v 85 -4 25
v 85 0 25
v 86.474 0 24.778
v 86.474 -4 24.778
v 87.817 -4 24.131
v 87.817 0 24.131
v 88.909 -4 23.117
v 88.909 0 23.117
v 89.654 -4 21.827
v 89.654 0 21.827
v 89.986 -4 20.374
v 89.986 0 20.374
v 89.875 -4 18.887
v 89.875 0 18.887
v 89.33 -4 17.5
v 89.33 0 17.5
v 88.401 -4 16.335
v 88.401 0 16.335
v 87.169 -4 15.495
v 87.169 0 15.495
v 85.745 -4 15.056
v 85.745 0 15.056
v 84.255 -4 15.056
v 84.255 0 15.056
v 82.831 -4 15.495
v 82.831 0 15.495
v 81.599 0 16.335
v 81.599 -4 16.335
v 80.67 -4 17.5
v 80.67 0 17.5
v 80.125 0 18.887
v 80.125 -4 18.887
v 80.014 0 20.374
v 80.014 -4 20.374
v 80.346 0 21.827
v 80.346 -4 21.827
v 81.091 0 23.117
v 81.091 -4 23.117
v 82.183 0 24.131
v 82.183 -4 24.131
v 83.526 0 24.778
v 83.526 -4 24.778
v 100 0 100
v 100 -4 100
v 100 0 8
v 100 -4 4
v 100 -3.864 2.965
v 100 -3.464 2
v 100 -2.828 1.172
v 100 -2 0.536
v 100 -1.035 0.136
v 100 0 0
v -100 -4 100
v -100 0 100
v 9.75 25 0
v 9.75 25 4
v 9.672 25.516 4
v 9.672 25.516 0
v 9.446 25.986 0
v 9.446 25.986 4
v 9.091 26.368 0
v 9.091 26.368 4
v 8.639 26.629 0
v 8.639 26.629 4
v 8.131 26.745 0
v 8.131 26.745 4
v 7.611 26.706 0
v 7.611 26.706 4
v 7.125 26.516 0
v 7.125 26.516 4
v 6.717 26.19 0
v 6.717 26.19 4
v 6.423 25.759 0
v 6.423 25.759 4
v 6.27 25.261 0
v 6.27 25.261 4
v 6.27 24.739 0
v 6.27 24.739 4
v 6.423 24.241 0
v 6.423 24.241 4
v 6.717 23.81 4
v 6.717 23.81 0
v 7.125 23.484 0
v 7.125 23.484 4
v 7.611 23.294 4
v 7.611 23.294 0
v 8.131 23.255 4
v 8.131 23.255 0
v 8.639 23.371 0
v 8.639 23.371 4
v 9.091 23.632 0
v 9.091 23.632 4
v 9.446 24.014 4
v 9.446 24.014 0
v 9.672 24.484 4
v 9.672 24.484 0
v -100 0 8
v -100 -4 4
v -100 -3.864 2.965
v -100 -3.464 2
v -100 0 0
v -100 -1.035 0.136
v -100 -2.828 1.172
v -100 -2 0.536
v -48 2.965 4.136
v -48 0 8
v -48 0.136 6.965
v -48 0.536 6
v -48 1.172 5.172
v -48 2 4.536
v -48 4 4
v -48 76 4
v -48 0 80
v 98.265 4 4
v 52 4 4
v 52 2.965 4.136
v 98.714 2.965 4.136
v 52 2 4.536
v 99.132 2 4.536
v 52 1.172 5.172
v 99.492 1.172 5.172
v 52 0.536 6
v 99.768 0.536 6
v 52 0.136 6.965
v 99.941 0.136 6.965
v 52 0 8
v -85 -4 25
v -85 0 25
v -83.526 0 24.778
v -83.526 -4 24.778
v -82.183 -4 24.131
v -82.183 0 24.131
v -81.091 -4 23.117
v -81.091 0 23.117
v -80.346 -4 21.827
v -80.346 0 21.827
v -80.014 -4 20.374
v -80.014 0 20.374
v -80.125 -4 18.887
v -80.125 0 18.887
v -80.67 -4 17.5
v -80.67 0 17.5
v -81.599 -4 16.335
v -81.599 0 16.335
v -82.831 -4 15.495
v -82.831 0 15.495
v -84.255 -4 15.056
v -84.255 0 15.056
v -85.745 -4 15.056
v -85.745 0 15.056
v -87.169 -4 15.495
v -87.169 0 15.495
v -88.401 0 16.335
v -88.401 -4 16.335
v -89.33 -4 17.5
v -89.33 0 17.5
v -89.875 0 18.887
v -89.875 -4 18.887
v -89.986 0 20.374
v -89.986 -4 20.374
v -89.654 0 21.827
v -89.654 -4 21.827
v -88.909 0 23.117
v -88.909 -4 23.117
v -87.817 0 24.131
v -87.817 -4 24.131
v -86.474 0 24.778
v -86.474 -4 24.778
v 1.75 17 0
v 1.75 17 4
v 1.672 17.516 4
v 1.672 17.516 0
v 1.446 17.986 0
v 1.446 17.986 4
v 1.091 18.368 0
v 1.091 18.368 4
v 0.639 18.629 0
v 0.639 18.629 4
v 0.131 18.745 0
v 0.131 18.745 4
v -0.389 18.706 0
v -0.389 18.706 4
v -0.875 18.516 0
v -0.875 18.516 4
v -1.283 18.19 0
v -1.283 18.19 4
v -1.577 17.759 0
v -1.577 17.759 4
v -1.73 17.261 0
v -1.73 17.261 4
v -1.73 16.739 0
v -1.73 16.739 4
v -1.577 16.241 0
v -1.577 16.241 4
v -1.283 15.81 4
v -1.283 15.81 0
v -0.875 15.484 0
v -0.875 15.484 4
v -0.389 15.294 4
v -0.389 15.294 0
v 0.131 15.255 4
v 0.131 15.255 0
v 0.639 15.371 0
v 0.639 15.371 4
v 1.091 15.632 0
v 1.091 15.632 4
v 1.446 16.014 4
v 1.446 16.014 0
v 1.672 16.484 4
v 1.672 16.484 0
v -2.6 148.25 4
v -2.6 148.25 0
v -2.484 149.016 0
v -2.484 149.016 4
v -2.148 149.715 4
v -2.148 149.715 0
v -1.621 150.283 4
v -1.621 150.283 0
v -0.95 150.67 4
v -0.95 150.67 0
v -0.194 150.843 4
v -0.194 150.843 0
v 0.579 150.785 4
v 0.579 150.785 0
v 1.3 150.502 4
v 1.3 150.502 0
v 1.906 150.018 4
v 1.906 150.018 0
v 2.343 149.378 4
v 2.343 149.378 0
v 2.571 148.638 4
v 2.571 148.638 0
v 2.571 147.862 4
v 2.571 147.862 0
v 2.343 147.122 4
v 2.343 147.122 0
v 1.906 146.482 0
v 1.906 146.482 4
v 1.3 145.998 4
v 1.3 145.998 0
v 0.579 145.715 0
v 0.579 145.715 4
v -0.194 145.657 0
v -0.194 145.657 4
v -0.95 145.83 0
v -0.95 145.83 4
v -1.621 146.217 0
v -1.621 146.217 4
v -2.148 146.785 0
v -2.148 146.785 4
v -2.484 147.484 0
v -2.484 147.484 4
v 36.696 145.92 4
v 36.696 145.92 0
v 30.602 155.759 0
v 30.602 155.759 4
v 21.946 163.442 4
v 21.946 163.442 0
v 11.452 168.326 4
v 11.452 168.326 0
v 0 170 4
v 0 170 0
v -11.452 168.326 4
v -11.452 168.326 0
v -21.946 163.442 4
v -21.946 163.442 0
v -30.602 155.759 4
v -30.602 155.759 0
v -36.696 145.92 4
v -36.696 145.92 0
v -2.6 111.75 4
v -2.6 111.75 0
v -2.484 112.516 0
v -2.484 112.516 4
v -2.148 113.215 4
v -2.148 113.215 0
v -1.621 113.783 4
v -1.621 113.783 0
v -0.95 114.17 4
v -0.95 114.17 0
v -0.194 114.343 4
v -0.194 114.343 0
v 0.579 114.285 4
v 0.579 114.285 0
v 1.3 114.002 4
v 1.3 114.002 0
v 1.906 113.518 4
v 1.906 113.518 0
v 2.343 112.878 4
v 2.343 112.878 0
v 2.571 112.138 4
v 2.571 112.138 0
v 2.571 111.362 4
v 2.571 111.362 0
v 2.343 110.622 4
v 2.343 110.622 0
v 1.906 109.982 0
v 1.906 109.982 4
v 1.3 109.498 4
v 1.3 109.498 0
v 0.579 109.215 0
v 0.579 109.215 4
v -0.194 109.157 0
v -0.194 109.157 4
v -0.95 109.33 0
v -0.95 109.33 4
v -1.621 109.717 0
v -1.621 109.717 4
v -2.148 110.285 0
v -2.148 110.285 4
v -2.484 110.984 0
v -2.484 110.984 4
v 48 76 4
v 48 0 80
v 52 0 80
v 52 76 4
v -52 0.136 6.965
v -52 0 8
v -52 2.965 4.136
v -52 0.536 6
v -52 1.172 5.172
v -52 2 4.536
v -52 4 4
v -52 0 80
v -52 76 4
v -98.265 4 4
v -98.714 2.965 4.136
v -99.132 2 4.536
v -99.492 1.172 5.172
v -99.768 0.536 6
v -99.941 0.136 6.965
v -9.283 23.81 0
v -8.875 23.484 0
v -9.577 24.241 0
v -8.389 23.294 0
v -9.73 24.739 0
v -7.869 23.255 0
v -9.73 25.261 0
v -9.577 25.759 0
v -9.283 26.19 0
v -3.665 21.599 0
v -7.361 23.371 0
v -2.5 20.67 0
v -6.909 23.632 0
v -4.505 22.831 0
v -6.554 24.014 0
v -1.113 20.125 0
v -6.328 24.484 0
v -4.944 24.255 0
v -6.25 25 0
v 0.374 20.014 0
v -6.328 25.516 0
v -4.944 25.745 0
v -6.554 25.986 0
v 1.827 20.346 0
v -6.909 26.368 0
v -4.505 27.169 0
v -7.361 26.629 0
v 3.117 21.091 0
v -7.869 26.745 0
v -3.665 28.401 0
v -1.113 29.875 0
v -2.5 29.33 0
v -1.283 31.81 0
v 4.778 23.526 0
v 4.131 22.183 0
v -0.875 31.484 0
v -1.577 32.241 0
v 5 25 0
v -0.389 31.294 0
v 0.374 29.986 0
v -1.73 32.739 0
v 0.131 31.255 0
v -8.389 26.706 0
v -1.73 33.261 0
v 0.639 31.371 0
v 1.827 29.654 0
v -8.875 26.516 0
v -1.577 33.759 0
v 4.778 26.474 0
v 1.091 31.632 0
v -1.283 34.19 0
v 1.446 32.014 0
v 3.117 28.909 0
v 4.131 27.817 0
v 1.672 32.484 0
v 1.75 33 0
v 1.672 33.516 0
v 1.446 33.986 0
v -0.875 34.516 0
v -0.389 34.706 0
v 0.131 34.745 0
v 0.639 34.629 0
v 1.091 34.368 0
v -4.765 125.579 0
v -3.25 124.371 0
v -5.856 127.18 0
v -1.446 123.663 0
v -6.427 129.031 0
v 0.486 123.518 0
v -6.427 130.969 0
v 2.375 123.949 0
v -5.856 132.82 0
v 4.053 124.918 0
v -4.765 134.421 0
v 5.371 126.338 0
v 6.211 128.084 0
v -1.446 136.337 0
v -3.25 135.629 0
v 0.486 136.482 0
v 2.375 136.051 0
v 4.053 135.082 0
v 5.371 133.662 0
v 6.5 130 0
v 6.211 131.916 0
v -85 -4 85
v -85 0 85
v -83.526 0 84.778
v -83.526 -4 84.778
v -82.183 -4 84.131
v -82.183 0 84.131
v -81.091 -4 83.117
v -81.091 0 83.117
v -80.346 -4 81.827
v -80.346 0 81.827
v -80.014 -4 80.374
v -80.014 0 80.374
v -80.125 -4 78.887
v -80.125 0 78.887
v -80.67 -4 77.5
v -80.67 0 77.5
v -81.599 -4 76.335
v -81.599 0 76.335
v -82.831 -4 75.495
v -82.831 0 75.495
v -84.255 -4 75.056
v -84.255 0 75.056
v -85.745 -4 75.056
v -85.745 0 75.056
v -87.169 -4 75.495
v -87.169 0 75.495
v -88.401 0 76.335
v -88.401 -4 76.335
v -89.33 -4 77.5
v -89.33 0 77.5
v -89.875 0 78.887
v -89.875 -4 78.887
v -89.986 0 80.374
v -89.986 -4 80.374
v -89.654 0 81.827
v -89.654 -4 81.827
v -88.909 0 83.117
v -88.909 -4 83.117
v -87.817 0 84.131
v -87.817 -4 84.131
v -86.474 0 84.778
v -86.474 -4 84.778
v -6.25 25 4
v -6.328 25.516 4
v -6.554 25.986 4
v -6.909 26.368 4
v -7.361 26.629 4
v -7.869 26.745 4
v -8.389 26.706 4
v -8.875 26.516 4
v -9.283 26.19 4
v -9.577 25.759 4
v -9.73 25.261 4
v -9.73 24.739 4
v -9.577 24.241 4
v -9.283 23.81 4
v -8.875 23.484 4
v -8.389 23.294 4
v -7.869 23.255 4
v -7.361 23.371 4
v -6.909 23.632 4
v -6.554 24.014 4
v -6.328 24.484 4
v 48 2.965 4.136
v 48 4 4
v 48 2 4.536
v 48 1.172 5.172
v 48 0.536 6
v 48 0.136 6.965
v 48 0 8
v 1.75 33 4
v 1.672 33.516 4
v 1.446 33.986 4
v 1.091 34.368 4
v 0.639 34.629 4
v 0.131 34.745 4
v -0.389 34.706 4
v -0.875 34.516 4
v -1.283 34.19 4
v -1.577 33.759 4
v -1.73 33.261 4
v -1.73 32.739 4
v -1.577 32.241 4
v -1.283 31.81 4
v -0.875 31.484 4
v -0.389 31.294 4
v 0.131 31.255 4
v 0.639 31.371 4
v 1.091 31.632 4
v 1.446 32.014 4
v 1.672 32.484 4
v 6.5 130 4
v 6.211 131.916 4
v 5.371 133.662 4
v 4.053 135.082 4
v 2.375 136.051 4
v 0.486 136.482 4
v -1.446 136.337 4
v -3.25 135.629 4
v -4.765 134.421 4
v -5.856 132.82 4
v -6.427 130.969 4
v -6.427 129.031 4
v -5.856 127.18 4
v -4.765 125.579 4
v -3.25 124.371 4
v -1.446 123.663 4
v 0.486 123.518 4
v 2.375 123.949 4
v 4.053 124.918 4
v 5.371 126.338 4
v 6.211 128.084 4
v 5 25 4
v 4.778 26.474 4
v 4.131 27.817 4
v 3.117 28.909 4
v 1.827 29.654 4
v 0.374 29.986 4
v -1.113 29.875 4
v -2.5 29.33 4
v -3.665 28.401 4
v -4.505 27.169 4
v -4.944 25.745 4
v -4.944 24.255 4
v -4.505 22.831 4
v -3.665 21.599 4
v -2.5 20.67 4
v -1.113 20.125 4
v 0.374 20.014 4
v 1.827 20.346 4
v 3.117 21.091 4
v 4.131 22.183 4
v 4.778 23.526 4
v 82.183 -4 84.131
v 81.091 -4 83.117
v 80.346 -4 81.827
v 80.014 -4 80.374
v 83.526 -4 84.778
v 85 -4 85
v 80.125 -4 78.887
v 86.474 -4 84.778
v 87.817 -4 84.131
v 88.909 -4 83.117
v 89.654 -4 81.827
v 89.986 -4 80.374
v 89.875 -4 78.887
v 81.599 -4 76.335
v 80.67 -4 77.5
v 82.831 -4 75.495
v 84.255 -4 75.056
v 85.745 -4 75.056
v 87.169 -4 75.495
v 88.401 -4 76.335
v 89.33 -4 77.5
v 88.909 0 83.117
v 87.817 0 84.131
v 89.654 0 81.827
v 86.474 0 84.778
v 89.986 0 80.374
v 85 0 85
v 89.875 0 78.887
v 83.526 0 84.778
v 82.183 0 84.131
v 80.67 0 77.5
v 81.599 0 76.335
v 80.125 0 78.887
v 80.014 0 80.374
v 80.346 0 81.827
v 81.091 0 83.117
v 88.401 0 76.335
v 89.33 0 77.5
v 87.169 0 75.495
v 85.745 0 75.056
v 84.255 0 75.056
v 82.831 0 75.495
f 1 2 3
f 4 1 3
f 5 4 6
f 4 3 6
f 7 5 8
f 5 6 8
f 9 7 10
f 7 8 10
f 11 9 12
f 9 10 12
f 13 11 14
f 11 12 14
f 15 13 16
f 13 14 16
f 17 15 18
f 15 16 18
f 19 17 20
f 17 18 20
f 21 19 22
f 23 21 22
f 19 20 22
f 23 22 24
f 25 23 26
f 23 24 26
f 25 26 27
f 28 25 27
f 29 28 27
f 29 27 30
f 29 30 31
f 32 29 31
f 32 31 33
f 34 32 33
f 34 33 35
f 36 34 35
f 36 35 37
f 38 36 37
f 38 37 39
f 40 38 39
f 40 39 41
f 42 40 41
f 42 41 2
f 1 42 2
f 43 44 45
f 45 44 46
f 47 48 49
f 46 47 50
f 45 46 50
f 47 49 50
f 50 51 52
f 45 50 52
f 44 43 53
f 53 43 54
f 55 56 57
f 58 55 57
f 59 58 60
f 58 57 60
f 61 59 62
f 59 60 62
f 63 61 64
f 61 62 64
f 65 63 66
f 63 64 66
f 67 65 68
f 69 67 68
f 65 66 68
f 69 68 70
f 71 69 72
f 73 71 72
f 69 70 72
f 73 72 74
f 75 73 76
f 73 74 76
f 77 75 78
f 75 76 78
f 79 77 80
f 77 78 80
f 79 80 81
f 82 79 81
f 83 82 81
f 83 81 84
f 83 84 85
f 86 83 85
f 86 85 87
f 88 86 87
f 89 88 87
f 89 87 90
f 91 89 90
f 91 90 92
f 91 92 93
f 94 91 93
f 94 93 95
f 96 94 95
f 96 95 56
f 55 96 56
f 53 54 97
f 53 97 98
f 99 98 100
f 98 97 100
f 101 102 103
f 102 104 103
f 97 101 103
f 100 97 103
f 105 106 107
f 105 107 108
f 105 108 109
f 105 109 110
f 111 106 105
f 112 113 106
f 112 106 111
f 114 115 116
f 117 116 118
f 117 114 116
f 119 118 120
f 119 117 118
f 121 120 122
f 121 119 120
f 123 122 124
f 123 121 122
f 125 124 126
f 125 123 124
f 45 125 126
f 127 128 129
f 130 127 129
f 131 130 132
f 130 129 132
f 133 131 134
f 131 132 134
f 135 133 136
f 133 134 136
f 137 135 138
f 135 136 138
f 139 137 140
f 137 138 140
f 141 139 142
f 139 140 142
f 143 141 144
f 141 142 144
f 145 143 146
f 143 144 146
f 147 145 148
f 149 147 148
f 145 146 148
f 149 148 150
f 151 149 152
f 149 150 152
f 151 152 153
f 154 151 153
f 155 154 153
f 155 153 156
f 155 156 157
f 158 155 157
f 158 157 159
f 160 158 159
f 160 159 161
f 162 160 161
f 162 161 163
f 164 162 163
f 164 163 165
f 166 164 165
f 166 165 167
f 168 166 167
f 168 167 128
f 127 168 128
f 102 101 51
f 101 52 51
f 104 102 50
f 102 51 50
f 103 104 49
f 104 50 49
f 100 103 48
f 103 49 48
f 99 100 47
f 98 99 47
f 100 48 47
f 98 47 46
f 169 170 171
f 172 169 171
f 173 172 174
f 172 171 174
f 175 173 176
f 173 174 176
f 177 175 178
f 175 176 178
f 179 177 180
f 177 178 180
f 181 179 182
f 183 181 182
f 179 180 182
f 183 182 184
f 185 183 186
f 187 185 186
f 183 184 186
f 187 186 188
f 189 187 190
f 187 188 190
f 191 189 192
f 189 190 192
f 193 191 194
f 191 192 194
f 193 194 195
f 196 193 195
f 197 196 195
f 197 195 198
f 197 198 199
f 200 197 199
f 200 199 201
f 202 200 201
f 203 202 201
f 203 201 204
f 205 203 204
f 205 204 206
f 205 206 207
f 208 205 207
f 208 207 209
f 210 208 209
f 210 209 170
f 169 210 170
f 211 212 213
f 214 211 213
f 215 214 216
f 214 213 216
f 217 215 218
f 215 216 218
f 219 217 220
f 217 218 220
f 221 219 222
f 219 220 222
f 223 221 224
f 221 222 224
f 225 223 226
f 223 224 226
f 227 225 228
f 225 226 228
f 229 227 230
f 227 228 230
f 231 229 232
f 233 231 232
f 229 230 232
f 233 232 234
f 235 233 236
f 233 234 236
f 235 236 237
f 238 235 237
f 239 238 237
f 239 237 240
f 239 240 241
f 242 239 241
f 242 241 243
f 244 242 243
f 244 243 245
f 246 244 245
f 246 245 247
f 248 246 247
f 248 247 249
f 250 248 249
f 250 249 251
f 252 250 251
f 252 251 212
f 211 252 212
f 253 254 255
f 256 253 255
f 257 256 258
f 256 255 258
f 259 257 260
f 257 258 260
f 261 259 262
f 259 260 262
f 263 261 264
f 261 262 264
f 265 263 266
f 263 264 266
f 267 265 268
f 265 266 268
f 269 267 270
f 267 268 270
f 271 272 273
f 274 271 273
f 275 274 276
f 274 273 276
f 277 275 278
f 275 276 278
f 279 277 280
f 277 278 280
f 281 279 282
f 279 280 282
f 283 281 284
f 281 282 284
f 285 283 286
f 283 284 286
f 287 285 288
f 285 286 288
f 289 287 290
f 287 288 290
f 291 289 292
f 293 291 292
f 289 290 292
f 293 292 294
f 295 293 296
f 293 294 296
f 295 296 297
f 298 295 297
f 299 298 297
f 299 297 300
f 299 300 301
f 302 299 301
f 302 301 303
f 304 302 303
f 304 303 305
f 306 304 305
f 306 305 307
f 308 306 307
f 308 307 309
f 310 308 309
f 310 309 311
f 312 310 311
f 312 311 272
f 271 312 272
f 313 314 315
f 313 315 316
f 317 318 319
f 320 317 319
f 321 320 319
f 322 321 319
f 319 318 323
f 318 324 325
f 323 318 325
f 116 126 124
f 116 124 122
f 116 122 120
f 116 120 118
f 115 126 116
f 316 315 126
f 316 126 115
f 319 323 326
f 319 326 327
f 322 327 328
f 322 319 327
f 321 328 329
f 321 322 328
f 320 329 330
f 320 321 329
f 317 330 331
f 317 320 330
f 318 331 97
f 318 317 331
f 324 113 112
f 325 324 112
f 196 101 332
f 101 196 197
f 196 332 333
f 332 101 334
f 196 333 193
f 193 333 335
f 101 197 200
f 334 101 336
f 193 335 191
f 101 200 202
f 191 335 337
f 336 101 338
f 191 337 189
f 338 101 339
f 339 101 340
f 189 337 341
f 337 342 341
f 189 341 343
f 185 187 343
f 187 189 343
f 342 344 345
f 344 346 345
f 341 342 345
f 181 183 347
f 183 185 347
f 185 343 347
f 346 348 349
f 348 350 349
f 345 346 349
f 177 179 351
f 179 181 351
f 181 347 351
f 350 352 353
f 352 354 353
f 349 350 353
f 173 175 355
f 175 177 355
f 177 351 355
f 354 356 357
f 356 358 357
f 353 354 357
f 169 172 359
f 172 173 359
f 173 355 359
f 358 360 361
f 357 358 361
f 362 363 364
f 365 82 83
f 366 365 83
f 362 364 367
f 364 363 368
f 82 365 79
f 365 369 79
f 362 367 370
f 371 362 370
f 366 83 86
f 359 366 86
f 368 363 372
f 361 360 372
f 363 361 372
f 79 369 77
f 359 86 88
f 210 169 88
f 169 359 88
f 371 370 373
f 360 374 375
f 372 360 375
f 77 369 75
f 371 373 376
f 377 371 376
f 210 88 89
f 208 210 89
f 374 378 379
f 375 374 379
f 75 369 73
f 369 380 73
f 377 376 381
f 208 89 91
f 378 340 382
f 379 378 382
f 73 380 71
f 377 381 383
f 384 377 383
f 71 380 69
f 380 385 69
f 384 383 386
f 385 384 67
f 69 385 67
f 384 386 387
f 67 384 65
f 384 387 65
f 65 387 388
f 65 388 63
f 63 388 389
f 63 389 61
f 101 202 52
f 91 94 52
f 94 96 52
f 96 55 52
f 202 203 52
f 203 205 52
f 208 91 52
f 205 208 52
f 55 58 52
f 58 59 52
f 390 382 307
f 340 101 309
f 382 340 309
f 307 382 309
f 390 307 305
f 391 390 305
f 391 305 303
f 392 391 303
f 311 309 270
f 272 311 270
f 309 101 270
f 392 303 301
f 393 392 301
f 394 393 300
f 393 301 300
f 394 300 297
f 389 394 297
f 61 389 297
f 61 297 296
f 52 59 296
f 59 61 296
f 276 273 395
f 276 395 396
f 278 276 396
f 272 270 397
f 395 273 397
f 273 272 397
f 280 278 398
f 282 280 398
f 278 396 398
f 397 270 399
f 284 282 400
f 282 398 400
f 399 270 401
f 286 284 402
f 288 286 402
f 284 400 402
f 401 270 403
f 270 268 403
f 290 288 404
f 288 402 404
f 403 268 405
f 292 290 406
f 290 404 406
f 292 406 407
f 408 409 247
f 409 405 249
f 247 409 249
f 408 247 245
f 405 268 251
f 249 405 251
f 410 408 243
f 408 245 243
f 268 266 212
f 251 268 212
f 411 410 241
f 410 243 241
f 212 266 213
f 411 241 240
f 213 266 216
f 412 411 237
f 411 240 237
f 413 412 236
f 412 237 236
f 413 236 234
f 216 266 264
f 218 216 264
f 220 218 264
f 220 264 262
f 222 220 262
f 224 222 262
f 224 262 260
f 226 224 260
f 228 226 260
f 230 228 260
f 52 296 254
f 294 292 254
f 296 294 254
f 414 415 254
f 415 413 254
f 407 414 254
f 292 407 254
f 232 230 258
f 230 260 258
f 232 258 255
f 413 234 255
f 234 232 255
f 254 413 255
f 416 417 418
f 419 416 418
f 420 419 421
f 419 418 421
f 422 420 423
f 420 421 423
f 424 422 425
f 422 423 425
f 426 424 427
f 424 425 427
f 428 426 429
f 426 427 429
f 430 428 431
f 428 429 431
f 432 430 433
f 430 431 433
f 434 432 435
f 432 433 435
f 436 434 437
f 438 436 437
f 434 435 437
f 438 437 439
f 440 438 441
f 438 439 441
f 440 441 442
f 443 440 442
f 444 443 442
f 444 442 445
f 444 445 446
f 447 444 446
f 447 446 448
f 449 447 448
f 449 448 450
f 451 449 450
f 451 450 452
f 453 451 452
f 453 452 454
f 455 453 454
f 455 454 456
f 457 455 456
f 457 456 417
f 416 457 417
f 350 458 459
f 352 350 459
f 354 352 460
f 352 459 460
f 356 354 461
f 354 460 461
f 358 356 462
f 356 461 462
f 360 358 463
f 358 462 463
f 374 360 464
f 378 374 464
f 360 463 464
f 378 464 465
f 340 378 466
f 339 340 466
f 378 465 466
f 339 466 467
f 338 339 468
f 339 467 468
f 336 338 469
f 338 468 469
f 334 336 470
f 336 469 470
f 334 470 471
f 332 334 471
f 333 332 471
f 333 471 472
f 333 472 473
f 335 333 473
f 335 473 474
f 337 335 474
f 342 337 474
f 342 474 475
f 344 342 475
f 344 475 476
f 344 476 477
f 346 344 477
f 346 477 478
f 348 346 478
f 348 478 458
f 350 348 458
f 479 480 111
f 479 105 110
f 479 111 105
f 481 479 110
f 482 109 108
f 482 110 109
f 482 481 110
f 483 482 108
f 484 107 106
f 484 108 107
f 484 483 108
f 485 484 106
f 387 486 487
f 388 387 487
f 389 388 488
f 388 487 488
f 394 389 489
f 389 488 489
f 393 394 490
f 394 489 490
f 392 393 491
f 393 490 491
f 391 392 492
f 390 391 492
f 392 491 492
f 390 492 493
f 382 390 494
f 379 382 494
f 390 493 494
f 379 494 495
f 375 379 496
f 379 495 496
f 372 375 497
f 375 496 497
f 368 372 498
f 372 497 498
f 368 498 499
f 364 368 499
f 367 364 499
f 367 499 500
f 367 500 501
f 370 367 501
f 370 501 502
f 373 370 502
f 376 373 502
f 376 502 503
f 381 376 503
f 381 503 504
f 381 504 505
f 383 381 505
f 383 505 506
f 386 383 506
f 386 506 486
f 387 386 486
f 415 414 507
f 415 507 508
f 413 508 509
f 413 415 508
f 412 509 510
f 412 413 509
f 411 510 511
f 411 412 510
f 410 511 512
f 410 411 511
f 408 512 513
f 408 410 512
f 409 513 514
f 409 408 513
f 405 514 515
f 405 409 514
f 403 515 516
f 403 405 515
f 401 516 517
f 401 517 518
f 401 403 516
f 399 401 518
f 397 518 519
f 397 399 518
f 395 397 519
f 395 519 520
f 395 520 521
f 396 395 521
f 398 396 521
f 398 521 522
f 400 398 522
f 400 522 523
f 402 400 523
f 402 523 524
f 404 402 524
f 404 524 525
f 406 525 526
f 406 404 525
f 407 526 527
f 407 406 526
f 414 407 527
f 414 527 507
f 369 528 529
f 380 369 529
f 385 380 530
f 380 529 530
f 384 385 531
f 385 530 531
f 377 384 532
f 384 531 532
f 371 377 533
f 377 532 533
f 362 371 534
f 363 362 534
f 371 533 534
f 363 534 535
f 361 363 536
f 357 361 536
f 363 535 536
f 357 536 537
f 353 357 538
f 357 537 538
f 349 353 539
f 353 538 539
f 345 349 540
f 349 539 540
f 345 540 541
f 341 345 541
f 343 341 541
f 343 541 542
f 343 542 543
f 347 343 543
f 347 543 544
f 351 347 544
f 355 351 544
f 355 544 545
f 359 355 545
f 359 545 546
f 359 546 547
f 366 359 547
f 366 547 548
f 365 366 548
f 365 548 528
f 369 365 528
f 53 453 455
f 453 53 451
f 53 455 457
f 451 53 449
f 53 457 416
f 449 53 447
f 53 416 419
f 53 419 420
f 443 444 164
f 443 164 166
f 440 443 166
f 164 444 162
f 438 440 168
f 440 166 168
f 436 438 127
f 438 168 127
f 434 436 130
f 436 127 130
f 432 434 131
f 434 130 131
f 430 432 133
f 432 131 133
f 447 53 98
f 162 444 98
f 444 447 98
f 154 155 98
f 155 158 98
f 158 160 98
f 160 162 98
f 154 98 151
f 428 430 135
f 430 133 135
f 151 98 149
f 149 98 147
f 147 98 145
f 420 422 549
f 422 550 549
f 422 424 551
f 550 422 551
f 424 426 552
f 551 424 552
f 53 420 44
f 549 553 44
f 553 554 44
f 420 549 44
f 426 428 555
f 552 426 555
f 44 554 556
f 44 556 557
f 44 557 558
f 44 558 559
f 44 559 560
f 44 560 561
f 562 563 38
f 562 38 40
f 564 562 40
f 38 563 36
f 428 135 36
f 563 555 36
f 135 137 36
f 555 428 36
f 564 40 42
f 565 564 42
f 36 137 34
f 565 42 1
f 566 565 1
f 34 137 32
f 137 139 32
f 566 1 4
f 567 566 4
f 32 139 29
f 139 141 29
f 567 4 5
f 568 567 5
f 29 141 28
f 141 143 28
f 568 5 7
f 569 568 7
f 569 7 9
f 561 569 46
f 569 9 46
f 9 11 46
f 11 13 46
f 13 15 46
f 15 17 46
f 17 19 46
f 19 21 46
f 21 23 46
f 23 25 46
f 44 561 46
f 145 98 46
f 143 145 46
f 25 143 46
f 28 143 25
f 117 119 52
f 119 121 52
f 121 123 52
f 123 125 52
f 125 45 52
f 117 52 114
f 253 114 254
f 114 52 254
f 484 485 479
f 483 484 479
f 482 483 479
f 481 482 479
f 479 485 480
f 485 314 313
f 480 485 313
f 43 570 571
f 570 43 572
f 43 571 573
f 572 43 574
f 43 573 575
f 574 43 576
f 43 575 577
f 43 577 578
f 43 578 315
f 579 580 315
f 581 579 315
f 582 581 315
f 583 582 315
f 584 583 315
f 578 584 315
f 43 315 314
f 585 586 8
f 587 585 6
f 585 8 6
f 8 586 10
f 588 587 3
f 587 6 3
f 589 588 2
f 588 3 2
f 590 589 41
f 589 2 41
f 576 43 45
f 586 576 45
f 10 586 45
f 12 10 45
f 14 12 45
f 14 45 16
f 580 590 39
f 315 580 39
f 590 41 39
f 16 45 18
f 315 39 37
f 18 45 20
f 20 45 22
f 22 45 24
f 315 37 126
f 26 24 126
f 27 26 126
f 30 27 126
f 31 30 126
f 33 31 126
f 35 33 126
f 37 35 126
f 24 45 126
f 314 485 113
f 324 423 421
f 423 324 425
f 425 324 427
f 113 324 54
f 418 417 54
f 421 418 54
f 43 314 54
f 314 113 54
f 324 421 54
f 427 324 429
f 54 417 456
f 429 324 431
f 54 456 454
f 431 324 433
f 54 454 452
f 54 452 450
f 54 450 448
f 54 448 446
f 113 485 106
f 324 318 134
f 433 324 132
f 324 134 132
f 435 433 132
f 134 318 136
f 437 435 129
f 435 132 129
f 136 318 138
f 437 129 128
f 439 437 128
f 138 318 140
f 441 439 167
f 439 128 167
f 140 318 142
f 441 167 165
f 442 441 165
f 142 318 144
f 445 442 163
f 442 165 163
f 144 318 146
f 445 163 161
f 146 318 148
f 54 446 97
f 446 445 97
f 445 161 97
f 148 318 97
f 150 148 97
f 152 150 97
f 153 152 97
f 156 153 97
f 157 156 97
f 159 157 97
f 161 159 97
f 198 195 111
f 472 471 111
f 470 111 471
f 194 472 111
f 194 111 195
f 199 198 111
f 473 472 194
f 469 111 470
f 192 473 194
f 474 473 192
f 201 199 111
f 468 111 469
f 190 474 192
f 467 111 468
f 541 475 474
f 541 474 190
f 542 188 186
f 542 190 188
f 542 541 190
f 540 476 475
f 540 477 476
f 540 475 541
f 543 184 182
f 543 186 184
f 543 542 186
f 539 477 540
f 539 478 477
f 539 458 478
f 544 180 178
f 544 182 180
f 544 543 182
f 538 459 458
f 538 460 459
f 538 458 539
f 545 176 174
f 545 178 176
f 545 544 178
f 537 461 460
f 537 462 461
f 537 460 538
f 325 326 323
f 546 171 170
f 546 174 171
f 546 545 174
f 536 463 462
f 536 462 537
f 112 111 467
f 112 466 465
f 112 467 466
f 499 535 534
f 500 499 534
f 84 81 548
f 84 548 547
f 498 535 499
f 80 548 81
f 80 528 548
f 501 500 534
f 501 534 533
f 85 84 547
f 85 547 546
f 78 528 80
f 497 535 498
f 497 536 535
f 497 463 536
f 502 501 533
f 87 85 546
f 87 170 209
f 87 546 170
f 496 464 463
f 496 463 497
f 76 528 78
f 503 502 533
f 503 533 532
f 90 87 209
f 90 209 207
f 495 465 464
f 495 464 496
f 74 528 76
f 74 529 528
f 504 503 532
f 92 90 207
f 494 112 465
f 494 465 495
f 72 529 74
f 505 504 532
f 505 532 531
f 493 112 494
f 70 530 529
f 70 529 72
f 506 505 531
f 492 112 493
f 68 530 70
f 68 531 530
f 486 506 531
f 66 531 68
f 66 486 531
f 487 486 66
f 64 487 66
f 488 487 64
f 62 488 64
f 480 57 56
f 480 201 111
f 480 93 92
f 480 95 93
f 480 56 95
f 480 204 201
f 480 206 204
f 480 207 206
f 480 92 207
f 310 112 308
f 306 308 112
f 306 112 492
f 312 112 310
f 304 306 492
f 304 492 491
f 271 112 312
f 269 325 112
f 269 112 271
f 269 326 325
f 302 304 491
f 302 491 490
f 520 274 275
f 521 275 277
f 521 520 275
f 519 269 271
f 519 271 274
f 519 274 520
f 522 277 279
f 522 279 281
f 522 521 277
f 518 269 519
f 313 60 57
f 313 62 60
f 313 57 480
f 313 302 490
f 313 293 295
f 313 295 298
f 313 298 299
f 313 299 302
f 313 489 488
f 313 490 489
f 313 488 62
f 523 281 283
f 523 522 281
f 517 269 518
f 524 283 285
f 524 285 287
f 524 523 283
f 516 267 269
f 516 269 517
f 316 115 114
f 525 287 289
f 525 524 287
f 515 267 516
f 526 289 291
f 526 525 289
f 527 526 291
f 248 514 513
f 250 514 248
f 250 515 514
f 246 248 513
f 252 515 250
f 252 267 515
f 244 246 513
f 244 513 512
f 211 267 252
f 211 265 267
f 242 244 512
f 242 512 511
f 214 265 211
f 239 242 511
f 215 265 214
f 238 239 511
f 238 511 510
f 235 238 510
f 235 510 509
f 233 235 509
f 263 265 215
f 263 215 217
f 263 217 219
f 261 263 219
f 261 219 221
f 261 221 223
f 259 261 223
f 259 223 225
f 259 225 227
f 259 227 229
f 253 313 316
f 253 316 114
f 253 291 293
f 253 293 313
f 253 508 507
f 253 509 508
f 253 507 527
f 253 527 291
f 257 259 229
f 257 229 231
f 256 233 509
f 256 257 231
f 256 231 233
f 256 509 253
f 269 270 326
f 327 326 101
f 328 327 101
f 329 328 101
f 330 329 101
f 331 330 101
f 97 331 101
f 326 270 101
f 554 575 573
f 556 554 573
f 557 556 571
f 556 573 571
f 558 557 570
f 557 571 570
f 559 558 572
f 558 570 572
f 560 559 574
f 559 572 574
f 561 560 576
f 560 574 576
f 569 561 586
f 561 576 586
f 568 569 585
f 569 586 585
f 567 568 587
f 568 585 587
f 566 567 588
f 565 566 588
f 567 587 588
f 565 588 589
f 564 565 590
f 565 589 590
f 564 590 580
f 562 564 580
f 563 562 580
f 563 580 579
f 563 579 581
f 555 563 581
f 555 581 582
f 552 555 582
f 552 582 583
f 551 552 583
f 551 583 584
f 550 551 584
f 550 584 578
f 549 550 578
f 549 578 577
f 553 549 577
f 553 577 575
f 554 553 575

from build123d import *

# Parameters (mm, degrees)
SKETCH1_R           = 6.5
BOSS_EXTRUDE1_DEPTH = 4
SKETCH4_R           = 2.6
CUT_EXTRUDE1_DEPTH  = 10
SKETCH5_W           = 200
SKETCH5_H           = 4
BOSS_EXTRUDE2_DEPTH = 100
FILLET1_R           = 4
SKETCH8_R           = 5
CUT_EXTRUDE2_DEPTH  = 100
SKETCH9_R           = 5
SKETCH9_R_2         = 1.75
CUT_EXTRUDE3_DEPTH  = 10
RIB1_REACH          = 249.79
SKETCH10_WALL_W     = 610.717552724
SKETCH10_WALL_H     = 4


with BuildPart() as part:
    # Sketch1 → Boss-Extrude1 (new body)
    with BuildSketch(Plane.XY):
        with BuildLine():
            Line((100, -4), (100, 0))
            Line((100, 0), (36.695562583, 145.919663525))
            ThreePointArc((36.695562583, 145.919663525), (0, 170), (-36.695562583, 145.919663525))
            Line((-36.695562583, 145.919663525), (-100, 0))
            Line((-100, 0), (-100, -4))
            Line((-100, -4), (100, -4))
        make_face()
        with Locations((0, 130)):
            Circle(SKETCH1_R, mode=Mode.SUBTRACT)
    extrude(amount=BOSS_EXTRUDE1_DEPTH)

    # Sketch4 → Cut-Extrude1 (cut)
    with BuildSketch(Plane(origin=(0, 0, 0), x_dir=(-1, 0, 0), z_dir=(0, 0, -1))):
        with Locations((0, 111.75)):
            Circle(SKETCH4_R)
        with Locations((0, 148.25)):
            Circle(SKETCH4_R)
    extrude(amount=-CUT_EXTRUDE1_DEPTH, mode=Mode.SUBTRACT)

    # Sketch5 → Boss-Extrude2 (add)
    with BuildSketch(Plane(origin=(0, 0, 0), x_dir=(-1, 0, 0), z_dir=(0, 0, -1))):
        with Locations((0, -2)):
            Rectangle(SKETCH5_W, SKETCH5_H)
    extrude(amount=-BOSS_EXTRUDE2_DEPTH)

    # Fillet1
    fillet1_edges = [part.edges().sort_by_distance(p)[0] for p in [
        (0, -4, 0),
        (0, 0, 4),
    ]]
    fillet(fillet1_edges, radius=FILLET1_R)

    # Sketch8 → Cut-Extrude2 (cut)
    with BuildSketch(Plane(origin=(0, 0, 0), x_dir=(1, 0, 0), z_dir=(0, 1, 0))):
        with Locations(Location((-85, -80, 0), (0, 0, 270))):
            Circle(SKETCH8_R)
        with Locations(Location((-85, -20, 0), (0, 0, 270))):
            Circle(SKETCH8_R)
        with Locations(Location((85, -80, 0), (0, 0, 270))):
            Circle(SKETCH8_R)
        with Locations(Location((85, -20, 0), (0, 0, 270))):
            Circle(SKETCH8_R)
    extrude(amount=-CUT_EXTRUDE2_DEPTH, mode=Mode.SUBTRACT)

    # Sketch9 → Cut-Extrude3 (cut)
    with BuildSketch(Plane.XY.offset(4)):
        with Locations((0, 25)):
            Circle(SKETCH9_R)
        with Locations((0, 33)):
            Circle(SKETCH9_R_2)
        with Locations((0, 17)):
            Circle(SKETCH9_R_2)
        with Locations((8, 25)):
            Circle(SKETCH9_R_2)
        with Locations((-8, 25)):
            Circle(SKETCH9_R_2)
    extrude(amount=-CUT_EXTRUDE3_DEPTH, mode=Mode.SUBTRACT)

    # Sketch10 wall → Rib1 (add, up to next)
    with BuildSketch(Plane(origin=(-50, 40, 40), x_dir=(0, 0.707106781187, -0.707106781187), z_dir=(0, -0.707106781187, -0.707106781187)), mode=Mode.PRIVATE) as rib1_sk1:
        Rectangle(SKETCH10_WALL_W, SKETCH10_WALL_H)
    rib1_tool1 = extrude(rib1_sk1.sketch, amount=RIB1_REACH, mode=Mode.PRIVATE) - part.part
    rib1 = rib1_tool1.solids().sort_by_distance((-50, 40, 40))[0]
    add(rib1)

    # Mirror1: Rib1 across plane
    add(rib1.mirror(Plane(origin=(0, 0, 0), x_dir=(0, 0, 1), z_dir=(1, 0, 0))))


solid = part.part
